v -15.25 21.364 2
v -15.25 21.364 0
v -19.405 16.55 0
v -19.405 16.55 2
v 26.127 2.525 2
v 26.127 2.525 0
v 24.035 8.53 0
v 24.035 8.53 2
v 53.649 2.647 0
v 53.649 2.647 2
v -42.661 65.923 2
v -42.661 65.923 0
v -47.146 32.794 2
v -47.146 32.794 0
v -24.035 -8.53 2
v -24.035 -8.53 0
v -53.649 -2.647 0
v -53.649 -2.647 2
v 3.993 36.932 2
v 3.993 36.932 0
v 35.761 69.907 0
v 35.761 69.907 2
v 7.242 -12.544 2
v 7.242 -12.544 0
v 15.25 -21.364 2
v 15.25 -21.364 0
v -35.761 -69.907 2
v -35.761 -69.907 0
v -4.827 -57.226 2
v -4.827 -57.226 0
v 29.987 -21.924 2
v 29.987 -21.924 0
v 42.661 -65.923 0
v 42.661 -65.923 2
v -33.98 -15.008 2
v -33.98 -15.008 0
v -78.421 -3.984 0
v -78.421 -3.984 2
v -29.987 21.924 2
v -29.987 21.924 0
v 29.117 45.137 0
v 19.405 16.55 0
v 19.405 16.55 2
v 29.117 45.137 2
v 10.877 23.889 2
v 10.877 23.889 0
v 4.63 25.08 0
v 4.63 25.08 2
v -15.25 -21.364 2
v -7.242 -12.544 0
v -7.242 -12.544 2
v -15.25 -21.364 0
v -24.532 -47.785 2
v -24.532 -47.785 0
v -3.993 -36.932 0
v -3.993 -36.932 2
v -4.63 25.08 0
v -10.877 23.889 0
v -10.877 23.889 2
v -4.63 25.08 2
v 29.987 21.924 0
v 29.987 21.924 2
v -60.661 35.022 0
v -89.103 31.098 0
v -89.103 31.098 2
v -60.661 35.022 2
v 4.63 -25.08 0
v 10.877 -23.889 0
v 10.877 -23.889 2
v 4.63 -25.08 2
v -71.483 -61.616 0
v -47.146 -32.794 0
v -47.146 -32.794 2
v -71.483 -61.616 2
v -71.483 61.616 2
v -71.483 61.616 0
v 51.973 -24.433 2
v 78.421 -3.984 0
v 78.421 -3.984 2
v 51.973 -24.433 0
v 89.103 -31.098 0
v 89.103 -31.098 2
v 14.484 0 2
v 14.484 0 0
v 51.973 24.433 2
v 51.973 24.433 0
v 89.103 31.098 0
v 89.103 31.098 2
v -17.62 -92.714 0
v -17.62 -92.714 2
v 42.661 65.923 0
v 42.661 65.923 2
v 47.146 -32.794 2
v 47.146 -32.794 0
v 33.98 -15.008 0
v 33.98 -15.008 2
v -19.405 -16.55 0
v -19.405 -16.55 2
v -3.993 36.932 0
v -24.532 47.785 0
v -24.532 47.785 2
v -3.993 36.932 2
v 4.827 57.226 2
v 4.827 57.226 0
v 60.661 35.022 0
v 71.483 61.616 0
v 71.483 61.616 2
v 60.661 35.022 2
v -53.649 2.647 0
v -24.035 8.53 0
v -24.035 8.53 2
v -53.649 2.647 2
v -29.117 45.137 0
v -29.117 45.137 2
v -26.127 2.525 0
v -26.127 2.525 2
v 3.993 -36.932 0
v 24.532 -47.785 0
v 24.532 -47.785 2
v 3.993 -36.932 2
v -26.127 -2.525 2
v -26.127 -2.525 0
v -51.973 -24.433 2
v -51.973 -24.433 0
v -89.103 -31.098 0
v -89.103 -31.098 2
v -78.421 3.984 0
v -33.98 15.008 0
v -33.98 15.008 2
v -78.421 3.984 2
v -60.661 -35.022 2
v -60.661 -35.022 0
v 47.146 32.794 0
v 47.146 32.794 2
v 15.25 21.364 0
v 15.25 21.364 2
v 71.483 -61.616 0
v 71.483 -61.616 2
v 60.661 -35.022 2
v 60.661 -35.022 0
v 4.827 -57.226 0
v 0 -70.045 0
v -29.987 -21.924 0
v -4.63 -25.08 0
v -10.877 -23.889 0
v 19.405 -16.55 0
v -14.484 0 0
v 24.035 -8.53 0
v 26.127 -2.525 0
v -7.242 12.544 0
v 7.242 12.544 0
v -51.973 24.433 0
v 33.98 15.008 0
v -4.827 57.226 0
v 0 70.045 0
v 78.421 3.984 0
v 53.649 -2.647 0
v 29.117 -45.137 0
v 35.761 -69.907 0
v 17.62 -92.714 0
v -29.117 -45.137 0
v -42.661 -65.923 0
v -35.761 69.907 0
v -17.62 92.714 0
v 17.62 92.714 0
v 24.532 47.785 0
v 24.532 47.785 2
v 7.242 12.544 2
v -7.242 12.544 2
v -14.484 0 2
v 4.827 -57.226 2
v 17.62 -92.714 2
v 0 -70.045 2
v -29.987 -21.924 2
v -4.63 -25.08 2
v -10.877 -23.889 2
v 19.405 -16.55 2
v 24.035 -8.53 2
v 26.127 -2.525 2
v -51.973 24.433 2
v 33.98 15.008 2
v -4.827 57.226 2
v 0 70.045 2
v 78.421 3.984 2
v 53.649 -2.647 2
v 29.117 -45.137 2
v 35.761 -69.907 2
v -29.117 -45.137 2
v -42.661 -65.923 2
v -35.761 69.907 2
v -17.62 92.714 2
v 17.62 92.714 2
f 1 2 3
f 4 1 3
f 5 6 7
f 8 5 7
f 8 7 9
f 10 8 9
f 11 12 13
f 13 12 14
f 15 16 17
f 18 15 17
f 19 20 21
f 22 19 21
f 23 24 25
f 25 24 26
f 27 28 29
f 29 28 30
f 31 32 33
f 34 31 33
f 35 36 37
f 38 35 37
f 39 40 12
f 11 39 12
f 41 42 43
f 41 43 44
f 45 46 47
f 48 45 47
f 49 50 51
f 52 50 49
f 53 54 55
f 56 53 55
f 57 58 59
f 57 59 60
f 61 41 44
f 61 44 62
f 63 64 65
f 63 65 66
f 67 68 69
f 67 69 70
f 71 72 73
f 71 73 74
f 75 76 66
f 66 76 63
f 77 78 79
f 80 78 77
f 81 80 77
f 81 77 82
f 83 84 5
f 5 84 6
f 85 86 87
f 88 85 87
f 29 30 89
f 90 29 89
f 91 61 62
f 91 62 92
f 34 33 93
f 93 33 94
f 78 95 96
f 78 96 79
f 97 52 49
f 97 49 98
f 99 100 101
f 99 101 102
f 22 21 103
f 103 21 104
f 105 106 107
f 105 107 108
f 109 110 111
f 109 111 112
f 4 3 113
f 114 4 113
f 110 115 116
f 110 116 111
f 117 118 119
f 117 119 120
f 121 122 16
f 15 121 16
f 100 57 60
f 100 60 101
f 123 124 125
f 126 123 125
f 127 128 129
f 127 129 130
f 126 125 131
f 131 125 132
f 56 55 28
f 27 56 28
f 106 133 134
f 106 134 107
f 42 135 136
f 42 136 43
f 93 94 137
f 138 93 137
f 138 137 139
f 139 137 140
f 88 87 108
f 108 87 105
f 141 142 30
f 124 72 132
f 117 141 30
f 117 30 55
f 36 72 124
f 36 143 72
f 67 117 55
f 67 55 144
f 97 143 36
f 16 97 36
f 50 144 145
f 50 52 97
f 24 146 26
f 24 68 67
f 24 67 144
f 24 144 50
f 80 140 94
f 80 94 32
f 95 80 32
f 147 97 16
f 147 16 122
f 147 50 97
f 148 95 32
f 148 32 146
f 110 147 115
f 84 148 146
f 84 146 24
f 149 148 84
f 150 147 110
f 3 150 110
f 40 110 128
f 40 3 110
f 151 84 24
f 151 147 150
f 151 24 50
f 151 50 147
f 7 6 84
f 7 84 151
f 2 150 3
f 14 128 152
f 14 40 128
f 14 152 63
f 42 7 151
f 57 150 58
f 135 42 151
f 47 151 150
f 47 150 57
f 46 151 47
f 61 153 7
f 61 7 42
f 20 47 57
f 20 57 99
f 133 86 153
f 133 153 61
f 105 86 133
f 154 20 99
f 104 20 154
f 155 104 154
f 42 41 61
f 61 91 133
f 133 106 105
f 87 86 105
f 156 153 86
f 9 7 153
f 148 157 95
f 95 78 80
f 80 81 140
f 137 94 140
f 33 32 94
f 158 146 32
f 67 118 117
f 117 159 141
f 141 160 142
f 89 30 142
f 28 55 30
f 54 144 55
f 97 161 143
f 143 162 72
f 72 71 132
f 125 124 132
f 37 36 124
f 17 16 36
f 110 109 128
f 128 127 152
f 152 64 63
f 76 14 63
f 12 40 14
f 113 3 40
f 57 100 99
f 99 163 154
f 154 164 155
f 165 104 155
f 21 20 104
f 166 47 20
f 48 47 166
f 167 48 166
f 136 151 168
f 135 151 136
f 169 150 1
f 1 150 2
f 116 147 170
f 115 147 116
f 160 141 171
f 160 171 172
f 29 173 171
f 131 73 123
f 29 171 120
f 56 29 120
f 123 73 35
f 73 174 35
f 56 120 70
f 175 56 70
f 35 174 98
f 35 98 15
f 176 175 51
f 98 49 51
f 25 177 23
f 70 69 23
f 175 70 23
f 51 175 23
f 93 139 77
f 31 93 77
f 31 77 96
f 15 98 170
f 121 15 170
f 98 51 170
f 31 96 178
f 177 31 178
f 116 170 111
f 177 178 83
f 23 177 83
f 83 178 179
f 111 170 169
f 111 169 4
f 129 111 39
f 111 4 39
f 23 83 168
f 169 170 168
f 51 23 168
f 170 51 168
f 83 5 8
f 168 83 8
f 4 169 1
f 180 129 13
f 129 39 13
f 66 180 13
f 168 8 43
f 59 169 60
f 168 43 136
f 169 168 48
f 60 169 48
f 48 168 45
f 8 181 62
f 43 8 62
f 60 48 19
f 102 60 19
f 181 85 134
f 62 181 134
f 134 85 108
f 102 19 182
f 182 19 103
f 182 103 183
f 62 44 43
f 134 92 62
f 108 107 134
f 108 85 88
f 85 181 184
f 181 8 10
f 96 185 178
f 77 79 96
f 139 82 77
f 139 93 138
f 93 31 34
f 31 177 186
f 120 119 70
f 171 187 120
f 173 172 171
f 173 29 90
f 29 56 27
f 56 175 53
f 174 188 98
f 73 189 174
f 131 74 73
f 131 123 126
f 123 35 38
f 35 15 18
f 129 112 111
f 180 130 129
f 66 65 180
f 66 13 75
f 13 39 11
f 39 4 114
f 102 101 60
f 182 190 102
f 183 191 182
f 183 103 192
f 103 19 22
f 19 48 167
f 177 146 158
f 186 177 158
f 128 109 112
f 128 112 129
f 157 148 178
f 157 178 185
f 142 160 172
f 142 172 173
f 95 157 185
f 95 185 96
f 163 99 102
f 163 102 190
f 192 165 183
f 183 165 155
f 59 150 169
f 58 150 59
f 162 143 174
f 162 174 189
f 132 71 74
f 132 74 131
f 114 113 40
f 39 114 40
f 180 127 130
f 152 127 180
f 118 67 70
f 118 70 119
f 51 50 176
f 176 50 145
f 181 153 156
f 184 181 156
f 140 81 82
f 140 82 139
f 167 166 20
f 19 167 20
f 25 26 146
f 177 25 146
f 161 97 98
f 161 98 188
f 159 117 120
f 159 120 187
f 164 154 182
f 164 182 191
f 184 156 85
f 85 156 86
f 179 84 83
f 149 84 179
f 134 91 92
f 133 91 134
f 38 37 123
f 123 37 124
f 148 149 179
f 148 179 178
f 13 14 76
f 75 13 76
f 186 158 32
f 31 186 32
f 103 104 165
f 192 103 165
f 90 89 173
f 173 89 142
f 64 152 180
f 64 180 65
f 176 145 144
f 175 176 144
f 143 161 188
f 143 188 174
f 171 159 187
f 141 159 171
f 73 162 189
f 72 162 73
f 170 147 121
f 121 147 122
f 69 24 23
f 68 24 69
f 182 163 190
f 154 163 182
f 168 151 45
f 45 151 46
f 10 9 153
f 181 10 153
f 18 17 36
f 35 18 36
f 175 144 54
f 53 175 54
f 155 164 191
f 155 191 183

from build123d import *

# Parameters (mm, degrees)
F1_DEPTH = 2
F4_COUNT = 6
F4_ANGLE = 300


with BuildPart() as f1:
    # F0 (on Top) → F1 (new body)
    with BuildSketch(Plane.XY):
        Polygon((4.630033, 25.07996), (24.53151, 47.784701), (3.992958, 36.931831), (35.760634, 69.906734), (4.827321, 57.226207), (17.619738, 92.714362), (0, 70.044786), (0, 0), (3.223337, 0), (10.876871, 23.889082), align=None)
    extrude(amount=F1_DEPTH)

    # F2: F1 across plane


with BuildPart() as f1_1:
    add(f1.part)
    add(f1.part.mirror(Plane.YZ))

    # F4: F1 ×6 about axis
    f4_axis = Axis((0, 0, 4.113019), (0, 0, 1))


with BuildPart() as f1_2:
    add(f1_1.part)
    for i in range(1, F4_COUNT):
        add(f1_1.part.rotate(f4_axis, i * F4_ANGLE / (F4_COUNT - 1)))


solid = f1_2.part
